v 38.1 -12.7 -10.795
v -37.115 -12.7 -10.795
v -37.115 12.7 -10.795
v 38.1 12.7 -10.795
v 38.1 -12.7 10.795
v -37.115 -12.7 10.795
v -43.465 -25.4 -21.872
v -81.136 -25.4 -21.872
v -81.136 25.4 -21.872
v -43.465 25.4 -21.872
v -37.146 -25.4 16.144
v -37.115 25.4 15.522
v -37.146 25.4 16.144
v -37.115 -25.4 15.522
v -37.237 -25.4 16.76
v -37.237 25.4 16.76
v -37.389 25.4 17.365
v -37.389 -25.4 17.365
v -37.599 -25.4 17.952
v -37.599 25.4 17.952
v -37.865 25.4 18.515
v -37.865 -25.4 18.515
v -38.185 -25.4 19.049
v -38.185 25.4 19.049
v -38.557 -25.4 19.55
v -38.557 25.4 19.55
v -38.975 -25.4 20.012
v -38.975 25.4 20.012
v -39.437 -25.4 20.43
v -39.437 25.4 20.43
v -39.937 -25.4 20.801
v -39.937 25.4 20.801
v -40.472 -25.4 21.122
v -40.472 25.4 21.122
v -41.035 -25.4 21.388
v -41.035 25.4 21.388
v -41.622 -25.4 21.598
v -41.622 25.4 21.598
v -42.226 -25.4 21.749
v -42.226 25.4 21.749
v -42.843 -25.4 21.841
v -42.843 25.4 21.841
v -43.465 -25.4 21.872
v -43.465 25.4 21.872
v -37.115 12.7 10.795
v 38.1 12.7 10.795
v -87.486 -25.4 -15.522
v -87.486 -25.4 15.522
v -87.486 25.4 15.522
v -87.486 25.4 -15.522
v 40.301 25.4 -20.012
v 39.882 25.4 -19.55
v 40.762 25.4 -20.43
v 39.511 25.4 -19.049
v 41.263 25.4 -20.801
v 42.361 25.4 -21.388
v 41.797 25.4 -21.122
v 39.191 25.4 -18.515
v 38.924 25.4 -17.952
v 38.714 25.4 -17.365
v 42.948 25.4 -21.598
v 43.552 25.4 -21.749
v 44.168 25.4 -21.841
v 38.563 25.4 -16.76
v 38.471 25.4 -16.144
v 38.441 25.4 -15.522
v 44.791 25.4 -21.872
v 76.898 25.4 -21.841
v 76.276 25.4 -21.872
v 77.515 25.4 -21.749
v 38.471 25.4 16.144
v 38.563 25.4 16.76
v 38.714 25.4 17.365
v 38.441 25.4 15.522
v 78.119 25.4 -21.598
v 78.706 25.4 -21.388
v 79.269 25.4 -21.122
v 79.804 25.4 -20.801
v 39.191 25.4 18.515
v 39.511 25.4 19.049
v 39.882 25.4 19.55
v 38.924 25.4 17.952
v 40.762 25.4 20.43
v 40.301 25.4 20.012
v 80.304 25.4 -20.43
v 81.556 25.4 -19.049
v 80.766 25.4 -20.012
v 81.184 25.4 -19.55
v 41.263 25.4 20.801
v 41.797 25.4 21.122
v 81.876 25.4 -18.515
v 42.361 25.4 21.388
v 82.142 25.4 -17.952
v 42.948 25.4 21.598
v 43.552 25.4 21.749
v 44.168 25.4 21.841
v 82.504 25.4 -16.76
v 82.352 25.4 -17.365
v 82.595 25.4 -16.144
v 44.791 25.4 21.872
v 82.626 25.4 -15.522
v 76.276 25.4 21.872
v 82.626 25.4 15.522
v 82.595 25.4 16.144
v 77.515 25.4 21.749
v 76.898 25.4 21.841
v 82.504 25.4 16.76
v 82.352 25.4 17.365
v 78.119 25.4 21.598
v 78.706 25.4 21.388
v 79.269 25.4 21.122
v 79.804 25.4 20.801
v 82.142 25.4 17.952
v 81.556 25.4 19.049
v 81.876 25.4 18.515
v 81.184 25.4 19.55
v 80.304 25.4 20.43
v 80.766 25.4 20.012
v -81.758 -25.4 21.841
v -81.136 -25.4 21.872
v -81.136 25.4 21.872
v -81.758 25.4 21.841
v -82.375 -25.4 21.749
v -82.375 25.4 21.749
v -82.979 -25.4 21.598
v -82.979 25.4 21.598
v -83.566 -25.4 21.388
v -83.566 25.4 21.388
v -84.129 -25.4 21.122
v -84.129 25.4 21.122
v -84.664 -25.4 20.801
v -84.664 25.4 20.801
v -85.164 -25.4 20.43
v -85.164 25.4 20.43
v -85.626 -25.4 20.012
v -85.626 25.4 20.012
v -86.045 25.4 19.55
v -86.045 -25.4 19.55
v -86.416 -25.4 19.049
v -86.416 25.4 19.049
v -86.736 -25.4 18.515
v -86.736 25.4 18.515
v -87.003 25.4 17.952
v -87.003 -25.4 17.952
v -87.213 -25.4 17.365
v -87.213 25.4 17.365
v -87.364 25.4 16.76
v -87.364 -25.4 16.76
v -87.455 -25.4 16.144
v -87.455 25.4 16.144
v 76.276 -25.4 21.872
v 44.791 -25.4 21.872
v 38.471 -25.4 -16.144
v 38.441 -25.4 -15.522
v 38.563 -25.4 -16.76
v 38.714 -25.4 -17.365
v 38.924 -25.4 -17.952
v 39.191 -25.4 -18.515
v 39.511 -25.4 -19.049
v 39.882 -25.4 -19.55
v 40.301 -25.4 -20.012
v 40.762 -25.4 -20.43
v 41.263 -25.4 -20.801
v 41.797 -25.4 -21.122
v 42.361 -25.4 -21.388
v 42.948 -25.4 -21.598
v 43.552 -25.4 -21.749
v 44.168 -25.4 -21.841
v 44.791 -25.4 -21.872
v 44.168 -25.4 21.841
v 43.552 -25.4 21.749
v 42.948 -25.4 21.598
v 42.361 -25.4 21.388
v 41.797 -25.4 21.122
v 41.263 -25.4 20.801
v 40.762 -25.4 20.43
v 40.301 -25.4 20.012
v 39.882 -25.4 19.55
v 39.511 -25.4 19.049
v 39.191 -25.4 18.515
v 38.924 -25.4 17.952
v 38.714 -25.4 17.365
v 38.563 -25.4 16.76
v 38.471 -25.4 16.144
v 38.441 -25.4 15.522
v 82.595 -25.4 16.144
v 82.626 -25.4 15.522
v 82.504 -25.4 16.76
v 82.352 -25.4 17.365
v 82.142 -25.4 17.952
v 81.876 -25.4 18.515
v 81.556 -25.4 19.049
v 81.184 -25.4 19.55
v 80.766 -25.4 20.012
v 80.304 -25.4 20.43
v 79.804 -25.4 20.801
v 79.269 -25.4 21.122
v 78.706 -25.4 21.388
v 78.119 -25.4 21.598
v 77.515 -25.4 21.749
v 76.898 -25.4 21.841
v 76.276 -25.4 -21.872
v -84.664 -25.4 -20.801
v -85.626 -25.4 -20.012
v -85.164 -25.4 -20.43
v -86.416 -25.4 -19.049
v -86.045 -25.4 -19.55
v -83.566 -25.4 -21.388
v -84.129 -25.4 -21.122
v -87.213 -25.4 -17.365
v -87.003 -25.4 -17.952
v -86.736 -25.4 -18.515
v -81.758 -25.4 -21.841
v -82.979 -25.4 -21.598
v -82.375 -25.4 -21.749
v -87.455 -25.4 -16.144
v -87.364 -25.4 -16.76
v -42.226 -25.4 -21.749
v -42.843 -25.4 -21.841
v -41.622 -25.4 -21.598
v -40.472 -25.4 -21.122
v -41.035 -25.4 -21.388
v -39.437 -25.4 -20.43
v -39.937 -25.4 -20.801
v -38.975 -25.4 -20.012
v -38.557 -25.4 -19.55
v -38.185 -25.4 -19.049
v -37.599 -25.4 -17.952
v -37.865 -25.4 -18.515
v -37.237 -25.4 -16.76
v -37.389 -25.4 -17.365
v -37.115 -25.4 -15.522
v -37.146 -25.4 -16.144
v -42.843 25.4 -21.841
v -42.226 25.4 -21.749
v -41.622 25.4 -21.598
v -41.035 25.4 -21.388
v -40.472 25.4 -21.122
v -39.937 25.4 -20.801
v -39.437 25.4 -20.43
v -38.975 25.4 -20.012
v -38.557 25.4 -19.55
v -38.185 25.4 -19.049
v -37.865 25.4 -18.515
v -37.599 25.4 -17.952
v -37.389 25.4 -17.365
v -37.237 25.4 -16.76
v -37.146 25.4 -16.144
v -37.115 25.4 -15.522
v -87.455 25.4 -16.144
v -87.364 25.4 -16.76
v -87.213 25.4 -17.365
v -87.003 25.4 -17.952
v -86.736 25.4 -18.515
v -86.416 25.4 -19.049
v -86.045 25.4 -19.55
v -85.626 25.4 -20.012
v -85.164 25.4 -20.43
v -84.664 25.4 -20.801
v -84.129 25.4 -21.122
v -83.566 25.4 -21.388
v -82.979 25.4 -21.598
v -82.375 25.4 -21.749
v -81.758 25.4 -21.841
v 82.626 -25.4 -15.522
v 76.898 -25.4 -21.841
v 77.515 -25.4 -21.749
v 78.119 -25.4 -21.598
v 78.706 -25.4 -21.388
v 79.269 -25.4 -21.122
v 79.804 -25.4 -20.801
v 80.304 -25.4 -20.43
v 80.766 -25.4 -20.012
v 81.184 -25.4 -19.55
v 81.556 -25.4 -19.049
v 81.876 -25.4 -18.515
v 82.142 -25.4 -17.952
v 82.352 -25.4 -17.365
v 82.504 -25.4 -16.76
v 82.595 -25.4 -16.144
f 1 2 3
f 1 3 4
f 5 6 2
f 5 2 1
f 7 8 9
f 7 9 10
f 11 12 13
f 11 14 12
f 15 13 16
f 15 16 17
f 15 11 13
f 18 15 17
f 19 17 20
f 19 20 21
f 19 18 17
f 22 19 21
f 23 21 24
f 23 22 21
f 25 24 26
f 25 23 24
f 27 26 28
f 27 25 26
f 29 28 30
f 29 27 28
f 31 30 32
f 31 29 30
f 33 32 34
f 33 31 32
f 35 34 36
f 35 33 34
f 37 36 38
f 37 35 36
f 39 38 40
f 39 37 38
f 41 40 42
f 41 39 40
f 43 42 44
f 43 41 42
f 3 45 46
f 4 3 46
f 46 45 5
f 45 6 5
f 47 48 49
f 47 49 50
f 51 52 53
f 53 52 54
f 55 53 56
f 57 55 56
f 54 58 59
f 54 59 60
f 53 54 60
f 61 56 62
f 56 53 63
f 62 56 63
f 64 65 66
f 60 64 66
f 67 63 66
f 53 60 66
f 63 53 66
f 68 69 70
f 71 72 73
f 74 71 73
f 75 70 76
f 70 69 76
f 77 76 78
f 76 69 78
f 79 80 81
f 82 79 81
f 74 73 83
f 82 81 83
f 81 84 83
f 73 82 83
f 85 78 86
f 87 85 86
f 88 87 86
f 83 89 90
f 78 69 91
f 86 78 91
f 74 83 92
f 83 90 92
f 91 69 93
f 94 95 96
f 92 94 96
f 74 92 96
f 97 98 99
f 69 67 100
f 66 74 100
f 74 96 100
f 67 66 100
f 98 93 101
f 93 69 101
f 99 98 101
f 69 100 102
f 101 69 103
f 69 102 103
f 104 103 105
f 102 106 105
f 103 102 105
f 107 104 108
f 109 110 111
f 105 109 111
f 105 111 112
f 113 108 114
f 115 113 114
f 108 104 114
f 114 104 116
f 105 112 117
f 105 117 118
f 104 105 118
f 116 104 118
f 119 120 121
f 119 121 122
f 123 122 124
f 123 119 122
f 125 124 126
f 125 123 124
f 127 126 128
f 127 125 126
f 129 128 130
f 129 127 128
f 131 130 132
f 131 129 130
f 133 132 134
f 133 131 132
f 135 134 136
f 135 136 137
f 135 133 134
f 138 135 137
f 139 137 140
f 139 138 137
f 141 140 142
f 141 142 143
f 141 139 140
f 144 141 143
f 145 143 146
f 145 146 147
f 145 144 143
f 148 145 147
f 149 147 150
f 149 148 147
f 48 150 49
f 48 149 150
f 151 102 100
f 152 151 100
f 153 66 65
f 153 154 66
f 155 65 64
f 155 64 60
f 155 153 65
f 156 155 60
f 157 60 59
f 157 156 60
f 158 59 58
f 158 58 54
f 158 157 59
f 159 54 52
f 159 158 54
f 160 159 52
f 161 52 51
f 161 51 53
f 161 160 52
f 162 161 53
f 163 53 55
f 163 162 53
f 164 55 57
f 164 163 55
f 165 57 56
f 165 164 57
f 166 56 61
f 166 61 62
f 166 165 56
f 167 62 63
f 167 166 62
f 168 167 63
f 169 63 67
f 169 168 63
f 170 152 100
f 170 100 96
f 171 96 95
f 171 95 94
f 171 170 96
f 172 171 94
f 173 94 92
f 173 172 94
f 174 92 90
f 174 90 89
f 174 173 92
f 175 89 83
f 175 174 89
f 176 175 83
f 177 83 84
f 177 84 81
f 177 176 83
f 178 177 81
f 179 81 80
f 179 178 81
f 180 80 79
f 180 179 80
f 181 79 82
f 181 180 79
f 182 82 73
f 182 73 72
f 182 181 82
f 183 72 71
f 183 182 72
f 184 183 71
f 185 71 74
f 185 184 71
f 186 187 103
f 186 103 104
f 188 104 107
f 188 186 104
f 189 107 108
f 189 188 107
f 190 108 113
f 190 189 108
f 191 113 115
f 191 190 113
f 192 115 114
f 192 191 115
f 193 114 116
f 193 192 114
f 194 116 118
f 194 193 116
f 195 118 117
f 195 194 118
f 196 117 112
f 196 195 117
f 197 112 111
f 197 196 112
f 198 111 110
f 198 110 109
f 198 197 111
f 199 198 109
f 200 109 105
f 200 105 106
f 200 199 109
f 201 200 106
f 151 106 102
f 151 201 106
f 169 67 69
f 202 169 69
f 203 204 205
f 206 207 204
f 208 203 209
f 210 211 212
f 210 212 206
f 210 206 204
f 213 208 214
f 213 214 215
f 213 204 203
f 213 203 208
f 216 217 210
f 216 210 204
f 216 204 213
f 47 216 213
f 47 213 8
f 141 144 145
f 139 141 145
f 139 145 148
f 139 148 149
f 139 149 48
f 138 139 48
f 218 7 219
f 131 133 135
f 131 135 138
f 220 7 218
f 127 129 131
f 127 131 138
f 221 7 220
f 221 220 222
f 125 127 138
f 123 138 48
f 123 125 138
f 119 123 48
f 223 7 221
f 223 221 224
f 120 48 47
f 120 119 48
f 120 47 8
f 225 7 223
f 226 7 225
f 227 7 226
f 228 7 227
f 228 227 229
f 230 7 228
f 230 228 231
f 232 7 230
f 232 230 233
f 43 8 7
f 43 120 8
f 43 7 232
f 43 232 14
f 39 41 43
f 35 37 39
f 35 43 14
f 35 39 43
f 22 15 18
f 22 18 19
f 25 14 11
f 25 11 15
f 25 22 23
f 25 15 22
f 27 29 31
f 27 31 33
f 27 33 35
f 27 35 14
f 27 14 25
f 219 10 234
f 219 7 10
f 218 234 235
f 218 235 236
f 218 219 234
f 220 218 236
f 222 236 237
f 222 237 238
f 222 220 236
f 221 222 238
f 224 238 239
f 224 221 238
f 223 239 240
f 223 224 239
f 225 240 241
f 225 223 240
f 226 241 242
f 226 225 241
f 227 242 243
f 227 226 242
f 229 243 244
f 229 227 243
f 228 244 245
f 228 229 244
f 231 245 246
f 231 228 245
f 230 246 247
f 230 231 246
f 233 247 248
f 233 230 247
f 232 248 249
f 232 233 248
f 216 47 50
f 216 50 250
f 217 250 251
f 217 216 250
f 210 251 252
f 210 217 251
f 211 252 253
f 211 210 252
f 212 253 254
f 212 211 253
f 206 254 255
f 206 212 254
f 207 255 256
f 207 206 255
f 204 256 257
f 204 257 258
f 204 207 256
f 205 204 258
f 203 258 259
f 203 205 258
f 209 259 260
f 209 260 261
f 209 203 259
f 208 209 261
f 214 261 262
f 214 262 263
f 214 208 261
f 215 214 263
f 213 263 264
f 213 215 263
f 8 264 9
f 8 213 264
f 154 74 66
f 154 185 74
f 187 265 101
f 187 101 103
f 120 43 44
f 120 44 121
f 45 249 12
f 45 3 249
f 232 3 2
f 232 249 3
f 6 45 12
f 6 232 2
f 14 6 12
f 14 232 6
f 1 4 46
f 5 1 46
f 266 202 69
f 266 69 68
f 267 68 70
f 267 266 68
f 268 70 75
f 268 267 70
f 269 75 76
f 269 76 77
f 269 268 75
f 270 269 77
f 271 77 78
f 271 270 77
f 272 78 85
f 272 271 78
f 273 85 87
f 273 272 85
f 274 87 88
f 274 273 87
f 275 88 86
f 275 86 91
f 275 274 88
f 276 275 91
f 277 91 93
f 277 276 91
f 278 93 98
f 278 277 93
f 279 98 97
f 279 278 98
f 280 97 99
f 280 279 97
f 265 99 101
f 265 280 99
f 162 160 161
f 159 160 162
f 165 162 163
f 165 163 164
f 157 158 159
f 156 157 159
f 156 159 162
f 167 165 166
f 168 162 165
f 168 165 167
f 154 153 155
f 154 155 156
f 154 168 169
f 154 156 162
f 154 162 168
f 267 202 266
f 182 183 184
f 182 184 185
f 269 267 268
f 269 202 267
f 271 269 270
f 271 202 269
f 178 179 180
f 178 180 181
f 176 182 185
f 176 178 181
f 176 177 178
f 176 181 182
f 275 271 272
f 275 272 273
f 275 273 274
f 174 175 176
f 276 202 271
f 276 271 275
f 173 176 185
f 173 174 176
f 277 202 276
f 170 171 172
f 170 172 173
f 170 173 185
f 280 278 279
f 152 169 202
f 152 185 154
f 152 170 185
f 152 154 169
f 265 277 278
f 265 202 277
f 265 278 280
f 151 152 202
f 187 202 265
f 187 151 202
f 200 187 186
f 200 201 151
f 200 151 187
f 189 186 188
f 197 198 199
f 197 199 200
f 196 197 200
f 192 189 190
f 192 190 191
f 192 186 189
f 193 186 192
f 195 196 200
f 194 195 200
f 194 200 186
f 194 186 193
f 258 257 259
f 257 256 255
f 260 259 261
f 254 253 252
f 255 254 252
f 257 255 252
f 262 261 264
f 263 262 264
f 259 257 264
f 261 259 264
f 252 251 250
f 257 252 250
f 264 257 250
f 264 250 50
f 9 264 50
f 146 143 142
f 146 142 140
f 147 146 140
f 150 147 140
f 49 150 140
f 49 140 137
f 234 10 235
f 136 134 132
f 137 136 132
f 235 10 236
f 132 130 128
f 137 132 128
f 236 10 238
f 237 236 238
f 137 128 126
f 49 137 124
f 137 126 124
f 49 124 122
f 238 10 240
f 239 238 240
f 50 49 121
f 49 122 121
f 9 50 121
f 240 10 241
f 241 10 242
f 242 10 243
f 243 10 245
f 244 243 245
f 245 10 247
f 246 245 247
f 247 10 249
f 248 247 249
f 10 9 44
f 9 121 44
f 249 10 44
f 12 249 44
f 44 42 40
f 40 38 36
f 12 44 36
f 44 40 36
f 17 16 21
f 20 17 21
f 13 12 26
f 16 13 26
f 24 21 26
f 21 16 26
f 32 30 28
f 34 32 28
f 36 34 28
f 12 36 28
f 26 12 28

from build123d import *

# Parameters (mm, degrees)
F1_DEPTH = 25.4
F0_W     = 0.9847166896
F0_H     = 21.59
F0_W_2   = 75.2152833104
F2_DEPTH = 12.7


with BuildPart() as f1:
    # F0 (on Front) → F1 (new body, symmetric)
    with BuildSketch(Plane.XZ):
        with BuildLine():
            Line((44.7908310056, -21.8715034425), (76.2756945729, -21.8715034425))
            ThreePointArc((76.2756945729, -21.8715034425), (80.7658226335, -20.0116315031), (82.6256945729, -15.5215034425))
            Line((82.6256945729, -15.5215034425), (82.6256945729, 15.5215034425))
            ThreePointArc((82.6256945729, 15.5215034425), (80.7658226335, 20.0116315031), (76.2756945729, 21.8715034425))
            Line((76.2756945729, 21.8715034425), (44.7908310056, 21.8715034425))
            ThreePointArc((44.7908310056, 21.8715034425), (40.300702945, 20.0116315031), (38.4408310056, 15.5215034425))
            Line((38.4408310056, 15.5215034425), (38.4408310056, -15.5215034425))
            ThreePointArc((38.4408310056, -15.5215034425), (40.300702945, -20.0116315031), (44.7908310056, -21.8715034425))
        make_face()
    extrude(amount=F1_DEPTH, both=True)


with BuildPart() as f1b:
    # F0 (on Front) → F1, piece 2 (new body, symmetric)
    with BuildSketch(Plane.XZ):
        with BuildLine():
            Line((-38.1, -10.795), (-38.1, 10.795))
            Line((-38.1, 10.795), (-37.1152833104, 10.795))
            Line((-37.1152833104, 10.795), (-37.1152833104, 15.5215034425))
            ThreePointArc((-37.1152833104, 15.5215034425), (-38.9751552499, 20.0116315031), (-43.4652833104, 21.8715034425))
            Line((-43.4652833104, 21.8715034425), (-81.1360212207, 21.8715034425))
            ThreePointArc((-81.1360212207, 21.8715034425), (-85.6261492812, 20.0116315031), (-87.4860212207, 15.5215034425))
            Line((-87.4860212207, 15.5215034425), (-87.4860212207, -15.5215034425))
            ThreePointArc((-87.4860212207, -15.5215034425), (-85.6261492812, -20.0116315031), (-81.1360212207, -21.8715034425))
            Line((-81.1360212207, -21.8715034425), (-43.4652833104, -21.8715034425))
            ThreePointArc((-43.4652833104, -21.8715034425), (-38.9751552499, -20.0116315031), (-37.1152833104, -15.5215034425))
            Line((-37.1152833104, -15.5215034425), (-37.1152833104, -10.795))
            Line((-37.1152833104, -10.795), (-38.1, -10.795))
        make_face()
        with Locations((-37.6076416552, 0)):
            Rectangle(F0_W, F0_H)
    extrude(amount=F1_DEPTH, both=True)

    # F0 (on Front) → F2 (join, symmetric)
    with BuildSketch(Plane.XZ):
        with Locations((0.4923583448, 0)):
            Rectangle(F0_W_2, F0_H)
    extrude(amount=F2_DEPTH, both=True)


solid = Compound([f1.part, f1b.part])
